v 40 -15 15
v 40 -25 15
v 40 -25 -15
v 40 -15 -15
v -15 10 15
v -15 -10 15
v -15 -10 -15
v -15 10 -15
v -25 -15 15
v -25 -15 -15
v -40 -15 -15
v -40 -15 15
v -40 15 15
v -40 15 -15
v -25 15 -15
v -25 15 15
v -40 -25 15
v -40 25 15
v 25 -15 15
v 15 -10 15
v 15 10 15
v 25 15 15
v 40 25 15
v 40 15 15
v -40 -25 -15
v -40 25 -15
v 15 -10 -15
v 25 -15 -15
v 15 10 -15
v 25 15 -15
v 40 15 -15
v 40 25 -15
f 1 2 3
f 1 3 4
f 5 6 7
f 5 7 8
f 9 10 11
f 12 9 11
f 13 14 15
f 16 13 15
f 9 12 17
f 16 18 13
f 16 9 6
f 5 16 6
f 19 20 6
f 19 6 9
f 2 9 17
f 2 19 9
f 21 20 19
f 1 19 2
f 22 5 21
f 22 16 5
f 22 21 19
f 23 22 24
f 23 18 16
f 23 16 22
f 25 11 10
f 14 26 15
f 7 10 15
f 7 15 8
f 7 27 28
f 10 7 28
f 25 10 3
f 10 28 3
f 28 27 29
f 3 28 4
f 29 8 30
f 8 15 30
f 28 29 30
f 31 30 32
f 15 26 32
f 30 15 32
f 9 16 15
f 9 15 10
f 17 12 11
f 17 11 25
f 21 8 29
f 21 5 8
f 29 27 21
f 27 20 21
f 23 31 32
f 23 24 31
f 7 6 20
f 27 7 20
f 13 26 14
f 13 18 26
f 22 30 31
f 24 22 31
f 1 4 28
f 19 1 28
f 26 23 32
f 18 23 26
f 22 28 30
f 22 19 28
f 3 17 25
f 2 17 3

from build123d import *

# Parameters (mm, degrees)
SKETCH1_W           = 30
SKETCH1_H           = 20
BOSS_EXTRUDE1_DEPTH = 15


with BuildPart() as part:
    # Sketch1 → Boss-Extrude1 (new, symmetric)
    with BuildSketch(Plane.XY):
        Polygon((-40, 15), (-25, 15), (-25, -15), (-40, -15), (-40, -25), (40, -25), (40, -15), (25, -15), (25, 15), (40, 15), (40, 25), (-40, 25), align=None)
        Rectangle(SKETCH1_W, SKETCH1_H, mode=Mode.SUBTRACT)
    extrude(amount=BOSS_EXTRUDE1_DEPTH, both=True)


solid = part.part
